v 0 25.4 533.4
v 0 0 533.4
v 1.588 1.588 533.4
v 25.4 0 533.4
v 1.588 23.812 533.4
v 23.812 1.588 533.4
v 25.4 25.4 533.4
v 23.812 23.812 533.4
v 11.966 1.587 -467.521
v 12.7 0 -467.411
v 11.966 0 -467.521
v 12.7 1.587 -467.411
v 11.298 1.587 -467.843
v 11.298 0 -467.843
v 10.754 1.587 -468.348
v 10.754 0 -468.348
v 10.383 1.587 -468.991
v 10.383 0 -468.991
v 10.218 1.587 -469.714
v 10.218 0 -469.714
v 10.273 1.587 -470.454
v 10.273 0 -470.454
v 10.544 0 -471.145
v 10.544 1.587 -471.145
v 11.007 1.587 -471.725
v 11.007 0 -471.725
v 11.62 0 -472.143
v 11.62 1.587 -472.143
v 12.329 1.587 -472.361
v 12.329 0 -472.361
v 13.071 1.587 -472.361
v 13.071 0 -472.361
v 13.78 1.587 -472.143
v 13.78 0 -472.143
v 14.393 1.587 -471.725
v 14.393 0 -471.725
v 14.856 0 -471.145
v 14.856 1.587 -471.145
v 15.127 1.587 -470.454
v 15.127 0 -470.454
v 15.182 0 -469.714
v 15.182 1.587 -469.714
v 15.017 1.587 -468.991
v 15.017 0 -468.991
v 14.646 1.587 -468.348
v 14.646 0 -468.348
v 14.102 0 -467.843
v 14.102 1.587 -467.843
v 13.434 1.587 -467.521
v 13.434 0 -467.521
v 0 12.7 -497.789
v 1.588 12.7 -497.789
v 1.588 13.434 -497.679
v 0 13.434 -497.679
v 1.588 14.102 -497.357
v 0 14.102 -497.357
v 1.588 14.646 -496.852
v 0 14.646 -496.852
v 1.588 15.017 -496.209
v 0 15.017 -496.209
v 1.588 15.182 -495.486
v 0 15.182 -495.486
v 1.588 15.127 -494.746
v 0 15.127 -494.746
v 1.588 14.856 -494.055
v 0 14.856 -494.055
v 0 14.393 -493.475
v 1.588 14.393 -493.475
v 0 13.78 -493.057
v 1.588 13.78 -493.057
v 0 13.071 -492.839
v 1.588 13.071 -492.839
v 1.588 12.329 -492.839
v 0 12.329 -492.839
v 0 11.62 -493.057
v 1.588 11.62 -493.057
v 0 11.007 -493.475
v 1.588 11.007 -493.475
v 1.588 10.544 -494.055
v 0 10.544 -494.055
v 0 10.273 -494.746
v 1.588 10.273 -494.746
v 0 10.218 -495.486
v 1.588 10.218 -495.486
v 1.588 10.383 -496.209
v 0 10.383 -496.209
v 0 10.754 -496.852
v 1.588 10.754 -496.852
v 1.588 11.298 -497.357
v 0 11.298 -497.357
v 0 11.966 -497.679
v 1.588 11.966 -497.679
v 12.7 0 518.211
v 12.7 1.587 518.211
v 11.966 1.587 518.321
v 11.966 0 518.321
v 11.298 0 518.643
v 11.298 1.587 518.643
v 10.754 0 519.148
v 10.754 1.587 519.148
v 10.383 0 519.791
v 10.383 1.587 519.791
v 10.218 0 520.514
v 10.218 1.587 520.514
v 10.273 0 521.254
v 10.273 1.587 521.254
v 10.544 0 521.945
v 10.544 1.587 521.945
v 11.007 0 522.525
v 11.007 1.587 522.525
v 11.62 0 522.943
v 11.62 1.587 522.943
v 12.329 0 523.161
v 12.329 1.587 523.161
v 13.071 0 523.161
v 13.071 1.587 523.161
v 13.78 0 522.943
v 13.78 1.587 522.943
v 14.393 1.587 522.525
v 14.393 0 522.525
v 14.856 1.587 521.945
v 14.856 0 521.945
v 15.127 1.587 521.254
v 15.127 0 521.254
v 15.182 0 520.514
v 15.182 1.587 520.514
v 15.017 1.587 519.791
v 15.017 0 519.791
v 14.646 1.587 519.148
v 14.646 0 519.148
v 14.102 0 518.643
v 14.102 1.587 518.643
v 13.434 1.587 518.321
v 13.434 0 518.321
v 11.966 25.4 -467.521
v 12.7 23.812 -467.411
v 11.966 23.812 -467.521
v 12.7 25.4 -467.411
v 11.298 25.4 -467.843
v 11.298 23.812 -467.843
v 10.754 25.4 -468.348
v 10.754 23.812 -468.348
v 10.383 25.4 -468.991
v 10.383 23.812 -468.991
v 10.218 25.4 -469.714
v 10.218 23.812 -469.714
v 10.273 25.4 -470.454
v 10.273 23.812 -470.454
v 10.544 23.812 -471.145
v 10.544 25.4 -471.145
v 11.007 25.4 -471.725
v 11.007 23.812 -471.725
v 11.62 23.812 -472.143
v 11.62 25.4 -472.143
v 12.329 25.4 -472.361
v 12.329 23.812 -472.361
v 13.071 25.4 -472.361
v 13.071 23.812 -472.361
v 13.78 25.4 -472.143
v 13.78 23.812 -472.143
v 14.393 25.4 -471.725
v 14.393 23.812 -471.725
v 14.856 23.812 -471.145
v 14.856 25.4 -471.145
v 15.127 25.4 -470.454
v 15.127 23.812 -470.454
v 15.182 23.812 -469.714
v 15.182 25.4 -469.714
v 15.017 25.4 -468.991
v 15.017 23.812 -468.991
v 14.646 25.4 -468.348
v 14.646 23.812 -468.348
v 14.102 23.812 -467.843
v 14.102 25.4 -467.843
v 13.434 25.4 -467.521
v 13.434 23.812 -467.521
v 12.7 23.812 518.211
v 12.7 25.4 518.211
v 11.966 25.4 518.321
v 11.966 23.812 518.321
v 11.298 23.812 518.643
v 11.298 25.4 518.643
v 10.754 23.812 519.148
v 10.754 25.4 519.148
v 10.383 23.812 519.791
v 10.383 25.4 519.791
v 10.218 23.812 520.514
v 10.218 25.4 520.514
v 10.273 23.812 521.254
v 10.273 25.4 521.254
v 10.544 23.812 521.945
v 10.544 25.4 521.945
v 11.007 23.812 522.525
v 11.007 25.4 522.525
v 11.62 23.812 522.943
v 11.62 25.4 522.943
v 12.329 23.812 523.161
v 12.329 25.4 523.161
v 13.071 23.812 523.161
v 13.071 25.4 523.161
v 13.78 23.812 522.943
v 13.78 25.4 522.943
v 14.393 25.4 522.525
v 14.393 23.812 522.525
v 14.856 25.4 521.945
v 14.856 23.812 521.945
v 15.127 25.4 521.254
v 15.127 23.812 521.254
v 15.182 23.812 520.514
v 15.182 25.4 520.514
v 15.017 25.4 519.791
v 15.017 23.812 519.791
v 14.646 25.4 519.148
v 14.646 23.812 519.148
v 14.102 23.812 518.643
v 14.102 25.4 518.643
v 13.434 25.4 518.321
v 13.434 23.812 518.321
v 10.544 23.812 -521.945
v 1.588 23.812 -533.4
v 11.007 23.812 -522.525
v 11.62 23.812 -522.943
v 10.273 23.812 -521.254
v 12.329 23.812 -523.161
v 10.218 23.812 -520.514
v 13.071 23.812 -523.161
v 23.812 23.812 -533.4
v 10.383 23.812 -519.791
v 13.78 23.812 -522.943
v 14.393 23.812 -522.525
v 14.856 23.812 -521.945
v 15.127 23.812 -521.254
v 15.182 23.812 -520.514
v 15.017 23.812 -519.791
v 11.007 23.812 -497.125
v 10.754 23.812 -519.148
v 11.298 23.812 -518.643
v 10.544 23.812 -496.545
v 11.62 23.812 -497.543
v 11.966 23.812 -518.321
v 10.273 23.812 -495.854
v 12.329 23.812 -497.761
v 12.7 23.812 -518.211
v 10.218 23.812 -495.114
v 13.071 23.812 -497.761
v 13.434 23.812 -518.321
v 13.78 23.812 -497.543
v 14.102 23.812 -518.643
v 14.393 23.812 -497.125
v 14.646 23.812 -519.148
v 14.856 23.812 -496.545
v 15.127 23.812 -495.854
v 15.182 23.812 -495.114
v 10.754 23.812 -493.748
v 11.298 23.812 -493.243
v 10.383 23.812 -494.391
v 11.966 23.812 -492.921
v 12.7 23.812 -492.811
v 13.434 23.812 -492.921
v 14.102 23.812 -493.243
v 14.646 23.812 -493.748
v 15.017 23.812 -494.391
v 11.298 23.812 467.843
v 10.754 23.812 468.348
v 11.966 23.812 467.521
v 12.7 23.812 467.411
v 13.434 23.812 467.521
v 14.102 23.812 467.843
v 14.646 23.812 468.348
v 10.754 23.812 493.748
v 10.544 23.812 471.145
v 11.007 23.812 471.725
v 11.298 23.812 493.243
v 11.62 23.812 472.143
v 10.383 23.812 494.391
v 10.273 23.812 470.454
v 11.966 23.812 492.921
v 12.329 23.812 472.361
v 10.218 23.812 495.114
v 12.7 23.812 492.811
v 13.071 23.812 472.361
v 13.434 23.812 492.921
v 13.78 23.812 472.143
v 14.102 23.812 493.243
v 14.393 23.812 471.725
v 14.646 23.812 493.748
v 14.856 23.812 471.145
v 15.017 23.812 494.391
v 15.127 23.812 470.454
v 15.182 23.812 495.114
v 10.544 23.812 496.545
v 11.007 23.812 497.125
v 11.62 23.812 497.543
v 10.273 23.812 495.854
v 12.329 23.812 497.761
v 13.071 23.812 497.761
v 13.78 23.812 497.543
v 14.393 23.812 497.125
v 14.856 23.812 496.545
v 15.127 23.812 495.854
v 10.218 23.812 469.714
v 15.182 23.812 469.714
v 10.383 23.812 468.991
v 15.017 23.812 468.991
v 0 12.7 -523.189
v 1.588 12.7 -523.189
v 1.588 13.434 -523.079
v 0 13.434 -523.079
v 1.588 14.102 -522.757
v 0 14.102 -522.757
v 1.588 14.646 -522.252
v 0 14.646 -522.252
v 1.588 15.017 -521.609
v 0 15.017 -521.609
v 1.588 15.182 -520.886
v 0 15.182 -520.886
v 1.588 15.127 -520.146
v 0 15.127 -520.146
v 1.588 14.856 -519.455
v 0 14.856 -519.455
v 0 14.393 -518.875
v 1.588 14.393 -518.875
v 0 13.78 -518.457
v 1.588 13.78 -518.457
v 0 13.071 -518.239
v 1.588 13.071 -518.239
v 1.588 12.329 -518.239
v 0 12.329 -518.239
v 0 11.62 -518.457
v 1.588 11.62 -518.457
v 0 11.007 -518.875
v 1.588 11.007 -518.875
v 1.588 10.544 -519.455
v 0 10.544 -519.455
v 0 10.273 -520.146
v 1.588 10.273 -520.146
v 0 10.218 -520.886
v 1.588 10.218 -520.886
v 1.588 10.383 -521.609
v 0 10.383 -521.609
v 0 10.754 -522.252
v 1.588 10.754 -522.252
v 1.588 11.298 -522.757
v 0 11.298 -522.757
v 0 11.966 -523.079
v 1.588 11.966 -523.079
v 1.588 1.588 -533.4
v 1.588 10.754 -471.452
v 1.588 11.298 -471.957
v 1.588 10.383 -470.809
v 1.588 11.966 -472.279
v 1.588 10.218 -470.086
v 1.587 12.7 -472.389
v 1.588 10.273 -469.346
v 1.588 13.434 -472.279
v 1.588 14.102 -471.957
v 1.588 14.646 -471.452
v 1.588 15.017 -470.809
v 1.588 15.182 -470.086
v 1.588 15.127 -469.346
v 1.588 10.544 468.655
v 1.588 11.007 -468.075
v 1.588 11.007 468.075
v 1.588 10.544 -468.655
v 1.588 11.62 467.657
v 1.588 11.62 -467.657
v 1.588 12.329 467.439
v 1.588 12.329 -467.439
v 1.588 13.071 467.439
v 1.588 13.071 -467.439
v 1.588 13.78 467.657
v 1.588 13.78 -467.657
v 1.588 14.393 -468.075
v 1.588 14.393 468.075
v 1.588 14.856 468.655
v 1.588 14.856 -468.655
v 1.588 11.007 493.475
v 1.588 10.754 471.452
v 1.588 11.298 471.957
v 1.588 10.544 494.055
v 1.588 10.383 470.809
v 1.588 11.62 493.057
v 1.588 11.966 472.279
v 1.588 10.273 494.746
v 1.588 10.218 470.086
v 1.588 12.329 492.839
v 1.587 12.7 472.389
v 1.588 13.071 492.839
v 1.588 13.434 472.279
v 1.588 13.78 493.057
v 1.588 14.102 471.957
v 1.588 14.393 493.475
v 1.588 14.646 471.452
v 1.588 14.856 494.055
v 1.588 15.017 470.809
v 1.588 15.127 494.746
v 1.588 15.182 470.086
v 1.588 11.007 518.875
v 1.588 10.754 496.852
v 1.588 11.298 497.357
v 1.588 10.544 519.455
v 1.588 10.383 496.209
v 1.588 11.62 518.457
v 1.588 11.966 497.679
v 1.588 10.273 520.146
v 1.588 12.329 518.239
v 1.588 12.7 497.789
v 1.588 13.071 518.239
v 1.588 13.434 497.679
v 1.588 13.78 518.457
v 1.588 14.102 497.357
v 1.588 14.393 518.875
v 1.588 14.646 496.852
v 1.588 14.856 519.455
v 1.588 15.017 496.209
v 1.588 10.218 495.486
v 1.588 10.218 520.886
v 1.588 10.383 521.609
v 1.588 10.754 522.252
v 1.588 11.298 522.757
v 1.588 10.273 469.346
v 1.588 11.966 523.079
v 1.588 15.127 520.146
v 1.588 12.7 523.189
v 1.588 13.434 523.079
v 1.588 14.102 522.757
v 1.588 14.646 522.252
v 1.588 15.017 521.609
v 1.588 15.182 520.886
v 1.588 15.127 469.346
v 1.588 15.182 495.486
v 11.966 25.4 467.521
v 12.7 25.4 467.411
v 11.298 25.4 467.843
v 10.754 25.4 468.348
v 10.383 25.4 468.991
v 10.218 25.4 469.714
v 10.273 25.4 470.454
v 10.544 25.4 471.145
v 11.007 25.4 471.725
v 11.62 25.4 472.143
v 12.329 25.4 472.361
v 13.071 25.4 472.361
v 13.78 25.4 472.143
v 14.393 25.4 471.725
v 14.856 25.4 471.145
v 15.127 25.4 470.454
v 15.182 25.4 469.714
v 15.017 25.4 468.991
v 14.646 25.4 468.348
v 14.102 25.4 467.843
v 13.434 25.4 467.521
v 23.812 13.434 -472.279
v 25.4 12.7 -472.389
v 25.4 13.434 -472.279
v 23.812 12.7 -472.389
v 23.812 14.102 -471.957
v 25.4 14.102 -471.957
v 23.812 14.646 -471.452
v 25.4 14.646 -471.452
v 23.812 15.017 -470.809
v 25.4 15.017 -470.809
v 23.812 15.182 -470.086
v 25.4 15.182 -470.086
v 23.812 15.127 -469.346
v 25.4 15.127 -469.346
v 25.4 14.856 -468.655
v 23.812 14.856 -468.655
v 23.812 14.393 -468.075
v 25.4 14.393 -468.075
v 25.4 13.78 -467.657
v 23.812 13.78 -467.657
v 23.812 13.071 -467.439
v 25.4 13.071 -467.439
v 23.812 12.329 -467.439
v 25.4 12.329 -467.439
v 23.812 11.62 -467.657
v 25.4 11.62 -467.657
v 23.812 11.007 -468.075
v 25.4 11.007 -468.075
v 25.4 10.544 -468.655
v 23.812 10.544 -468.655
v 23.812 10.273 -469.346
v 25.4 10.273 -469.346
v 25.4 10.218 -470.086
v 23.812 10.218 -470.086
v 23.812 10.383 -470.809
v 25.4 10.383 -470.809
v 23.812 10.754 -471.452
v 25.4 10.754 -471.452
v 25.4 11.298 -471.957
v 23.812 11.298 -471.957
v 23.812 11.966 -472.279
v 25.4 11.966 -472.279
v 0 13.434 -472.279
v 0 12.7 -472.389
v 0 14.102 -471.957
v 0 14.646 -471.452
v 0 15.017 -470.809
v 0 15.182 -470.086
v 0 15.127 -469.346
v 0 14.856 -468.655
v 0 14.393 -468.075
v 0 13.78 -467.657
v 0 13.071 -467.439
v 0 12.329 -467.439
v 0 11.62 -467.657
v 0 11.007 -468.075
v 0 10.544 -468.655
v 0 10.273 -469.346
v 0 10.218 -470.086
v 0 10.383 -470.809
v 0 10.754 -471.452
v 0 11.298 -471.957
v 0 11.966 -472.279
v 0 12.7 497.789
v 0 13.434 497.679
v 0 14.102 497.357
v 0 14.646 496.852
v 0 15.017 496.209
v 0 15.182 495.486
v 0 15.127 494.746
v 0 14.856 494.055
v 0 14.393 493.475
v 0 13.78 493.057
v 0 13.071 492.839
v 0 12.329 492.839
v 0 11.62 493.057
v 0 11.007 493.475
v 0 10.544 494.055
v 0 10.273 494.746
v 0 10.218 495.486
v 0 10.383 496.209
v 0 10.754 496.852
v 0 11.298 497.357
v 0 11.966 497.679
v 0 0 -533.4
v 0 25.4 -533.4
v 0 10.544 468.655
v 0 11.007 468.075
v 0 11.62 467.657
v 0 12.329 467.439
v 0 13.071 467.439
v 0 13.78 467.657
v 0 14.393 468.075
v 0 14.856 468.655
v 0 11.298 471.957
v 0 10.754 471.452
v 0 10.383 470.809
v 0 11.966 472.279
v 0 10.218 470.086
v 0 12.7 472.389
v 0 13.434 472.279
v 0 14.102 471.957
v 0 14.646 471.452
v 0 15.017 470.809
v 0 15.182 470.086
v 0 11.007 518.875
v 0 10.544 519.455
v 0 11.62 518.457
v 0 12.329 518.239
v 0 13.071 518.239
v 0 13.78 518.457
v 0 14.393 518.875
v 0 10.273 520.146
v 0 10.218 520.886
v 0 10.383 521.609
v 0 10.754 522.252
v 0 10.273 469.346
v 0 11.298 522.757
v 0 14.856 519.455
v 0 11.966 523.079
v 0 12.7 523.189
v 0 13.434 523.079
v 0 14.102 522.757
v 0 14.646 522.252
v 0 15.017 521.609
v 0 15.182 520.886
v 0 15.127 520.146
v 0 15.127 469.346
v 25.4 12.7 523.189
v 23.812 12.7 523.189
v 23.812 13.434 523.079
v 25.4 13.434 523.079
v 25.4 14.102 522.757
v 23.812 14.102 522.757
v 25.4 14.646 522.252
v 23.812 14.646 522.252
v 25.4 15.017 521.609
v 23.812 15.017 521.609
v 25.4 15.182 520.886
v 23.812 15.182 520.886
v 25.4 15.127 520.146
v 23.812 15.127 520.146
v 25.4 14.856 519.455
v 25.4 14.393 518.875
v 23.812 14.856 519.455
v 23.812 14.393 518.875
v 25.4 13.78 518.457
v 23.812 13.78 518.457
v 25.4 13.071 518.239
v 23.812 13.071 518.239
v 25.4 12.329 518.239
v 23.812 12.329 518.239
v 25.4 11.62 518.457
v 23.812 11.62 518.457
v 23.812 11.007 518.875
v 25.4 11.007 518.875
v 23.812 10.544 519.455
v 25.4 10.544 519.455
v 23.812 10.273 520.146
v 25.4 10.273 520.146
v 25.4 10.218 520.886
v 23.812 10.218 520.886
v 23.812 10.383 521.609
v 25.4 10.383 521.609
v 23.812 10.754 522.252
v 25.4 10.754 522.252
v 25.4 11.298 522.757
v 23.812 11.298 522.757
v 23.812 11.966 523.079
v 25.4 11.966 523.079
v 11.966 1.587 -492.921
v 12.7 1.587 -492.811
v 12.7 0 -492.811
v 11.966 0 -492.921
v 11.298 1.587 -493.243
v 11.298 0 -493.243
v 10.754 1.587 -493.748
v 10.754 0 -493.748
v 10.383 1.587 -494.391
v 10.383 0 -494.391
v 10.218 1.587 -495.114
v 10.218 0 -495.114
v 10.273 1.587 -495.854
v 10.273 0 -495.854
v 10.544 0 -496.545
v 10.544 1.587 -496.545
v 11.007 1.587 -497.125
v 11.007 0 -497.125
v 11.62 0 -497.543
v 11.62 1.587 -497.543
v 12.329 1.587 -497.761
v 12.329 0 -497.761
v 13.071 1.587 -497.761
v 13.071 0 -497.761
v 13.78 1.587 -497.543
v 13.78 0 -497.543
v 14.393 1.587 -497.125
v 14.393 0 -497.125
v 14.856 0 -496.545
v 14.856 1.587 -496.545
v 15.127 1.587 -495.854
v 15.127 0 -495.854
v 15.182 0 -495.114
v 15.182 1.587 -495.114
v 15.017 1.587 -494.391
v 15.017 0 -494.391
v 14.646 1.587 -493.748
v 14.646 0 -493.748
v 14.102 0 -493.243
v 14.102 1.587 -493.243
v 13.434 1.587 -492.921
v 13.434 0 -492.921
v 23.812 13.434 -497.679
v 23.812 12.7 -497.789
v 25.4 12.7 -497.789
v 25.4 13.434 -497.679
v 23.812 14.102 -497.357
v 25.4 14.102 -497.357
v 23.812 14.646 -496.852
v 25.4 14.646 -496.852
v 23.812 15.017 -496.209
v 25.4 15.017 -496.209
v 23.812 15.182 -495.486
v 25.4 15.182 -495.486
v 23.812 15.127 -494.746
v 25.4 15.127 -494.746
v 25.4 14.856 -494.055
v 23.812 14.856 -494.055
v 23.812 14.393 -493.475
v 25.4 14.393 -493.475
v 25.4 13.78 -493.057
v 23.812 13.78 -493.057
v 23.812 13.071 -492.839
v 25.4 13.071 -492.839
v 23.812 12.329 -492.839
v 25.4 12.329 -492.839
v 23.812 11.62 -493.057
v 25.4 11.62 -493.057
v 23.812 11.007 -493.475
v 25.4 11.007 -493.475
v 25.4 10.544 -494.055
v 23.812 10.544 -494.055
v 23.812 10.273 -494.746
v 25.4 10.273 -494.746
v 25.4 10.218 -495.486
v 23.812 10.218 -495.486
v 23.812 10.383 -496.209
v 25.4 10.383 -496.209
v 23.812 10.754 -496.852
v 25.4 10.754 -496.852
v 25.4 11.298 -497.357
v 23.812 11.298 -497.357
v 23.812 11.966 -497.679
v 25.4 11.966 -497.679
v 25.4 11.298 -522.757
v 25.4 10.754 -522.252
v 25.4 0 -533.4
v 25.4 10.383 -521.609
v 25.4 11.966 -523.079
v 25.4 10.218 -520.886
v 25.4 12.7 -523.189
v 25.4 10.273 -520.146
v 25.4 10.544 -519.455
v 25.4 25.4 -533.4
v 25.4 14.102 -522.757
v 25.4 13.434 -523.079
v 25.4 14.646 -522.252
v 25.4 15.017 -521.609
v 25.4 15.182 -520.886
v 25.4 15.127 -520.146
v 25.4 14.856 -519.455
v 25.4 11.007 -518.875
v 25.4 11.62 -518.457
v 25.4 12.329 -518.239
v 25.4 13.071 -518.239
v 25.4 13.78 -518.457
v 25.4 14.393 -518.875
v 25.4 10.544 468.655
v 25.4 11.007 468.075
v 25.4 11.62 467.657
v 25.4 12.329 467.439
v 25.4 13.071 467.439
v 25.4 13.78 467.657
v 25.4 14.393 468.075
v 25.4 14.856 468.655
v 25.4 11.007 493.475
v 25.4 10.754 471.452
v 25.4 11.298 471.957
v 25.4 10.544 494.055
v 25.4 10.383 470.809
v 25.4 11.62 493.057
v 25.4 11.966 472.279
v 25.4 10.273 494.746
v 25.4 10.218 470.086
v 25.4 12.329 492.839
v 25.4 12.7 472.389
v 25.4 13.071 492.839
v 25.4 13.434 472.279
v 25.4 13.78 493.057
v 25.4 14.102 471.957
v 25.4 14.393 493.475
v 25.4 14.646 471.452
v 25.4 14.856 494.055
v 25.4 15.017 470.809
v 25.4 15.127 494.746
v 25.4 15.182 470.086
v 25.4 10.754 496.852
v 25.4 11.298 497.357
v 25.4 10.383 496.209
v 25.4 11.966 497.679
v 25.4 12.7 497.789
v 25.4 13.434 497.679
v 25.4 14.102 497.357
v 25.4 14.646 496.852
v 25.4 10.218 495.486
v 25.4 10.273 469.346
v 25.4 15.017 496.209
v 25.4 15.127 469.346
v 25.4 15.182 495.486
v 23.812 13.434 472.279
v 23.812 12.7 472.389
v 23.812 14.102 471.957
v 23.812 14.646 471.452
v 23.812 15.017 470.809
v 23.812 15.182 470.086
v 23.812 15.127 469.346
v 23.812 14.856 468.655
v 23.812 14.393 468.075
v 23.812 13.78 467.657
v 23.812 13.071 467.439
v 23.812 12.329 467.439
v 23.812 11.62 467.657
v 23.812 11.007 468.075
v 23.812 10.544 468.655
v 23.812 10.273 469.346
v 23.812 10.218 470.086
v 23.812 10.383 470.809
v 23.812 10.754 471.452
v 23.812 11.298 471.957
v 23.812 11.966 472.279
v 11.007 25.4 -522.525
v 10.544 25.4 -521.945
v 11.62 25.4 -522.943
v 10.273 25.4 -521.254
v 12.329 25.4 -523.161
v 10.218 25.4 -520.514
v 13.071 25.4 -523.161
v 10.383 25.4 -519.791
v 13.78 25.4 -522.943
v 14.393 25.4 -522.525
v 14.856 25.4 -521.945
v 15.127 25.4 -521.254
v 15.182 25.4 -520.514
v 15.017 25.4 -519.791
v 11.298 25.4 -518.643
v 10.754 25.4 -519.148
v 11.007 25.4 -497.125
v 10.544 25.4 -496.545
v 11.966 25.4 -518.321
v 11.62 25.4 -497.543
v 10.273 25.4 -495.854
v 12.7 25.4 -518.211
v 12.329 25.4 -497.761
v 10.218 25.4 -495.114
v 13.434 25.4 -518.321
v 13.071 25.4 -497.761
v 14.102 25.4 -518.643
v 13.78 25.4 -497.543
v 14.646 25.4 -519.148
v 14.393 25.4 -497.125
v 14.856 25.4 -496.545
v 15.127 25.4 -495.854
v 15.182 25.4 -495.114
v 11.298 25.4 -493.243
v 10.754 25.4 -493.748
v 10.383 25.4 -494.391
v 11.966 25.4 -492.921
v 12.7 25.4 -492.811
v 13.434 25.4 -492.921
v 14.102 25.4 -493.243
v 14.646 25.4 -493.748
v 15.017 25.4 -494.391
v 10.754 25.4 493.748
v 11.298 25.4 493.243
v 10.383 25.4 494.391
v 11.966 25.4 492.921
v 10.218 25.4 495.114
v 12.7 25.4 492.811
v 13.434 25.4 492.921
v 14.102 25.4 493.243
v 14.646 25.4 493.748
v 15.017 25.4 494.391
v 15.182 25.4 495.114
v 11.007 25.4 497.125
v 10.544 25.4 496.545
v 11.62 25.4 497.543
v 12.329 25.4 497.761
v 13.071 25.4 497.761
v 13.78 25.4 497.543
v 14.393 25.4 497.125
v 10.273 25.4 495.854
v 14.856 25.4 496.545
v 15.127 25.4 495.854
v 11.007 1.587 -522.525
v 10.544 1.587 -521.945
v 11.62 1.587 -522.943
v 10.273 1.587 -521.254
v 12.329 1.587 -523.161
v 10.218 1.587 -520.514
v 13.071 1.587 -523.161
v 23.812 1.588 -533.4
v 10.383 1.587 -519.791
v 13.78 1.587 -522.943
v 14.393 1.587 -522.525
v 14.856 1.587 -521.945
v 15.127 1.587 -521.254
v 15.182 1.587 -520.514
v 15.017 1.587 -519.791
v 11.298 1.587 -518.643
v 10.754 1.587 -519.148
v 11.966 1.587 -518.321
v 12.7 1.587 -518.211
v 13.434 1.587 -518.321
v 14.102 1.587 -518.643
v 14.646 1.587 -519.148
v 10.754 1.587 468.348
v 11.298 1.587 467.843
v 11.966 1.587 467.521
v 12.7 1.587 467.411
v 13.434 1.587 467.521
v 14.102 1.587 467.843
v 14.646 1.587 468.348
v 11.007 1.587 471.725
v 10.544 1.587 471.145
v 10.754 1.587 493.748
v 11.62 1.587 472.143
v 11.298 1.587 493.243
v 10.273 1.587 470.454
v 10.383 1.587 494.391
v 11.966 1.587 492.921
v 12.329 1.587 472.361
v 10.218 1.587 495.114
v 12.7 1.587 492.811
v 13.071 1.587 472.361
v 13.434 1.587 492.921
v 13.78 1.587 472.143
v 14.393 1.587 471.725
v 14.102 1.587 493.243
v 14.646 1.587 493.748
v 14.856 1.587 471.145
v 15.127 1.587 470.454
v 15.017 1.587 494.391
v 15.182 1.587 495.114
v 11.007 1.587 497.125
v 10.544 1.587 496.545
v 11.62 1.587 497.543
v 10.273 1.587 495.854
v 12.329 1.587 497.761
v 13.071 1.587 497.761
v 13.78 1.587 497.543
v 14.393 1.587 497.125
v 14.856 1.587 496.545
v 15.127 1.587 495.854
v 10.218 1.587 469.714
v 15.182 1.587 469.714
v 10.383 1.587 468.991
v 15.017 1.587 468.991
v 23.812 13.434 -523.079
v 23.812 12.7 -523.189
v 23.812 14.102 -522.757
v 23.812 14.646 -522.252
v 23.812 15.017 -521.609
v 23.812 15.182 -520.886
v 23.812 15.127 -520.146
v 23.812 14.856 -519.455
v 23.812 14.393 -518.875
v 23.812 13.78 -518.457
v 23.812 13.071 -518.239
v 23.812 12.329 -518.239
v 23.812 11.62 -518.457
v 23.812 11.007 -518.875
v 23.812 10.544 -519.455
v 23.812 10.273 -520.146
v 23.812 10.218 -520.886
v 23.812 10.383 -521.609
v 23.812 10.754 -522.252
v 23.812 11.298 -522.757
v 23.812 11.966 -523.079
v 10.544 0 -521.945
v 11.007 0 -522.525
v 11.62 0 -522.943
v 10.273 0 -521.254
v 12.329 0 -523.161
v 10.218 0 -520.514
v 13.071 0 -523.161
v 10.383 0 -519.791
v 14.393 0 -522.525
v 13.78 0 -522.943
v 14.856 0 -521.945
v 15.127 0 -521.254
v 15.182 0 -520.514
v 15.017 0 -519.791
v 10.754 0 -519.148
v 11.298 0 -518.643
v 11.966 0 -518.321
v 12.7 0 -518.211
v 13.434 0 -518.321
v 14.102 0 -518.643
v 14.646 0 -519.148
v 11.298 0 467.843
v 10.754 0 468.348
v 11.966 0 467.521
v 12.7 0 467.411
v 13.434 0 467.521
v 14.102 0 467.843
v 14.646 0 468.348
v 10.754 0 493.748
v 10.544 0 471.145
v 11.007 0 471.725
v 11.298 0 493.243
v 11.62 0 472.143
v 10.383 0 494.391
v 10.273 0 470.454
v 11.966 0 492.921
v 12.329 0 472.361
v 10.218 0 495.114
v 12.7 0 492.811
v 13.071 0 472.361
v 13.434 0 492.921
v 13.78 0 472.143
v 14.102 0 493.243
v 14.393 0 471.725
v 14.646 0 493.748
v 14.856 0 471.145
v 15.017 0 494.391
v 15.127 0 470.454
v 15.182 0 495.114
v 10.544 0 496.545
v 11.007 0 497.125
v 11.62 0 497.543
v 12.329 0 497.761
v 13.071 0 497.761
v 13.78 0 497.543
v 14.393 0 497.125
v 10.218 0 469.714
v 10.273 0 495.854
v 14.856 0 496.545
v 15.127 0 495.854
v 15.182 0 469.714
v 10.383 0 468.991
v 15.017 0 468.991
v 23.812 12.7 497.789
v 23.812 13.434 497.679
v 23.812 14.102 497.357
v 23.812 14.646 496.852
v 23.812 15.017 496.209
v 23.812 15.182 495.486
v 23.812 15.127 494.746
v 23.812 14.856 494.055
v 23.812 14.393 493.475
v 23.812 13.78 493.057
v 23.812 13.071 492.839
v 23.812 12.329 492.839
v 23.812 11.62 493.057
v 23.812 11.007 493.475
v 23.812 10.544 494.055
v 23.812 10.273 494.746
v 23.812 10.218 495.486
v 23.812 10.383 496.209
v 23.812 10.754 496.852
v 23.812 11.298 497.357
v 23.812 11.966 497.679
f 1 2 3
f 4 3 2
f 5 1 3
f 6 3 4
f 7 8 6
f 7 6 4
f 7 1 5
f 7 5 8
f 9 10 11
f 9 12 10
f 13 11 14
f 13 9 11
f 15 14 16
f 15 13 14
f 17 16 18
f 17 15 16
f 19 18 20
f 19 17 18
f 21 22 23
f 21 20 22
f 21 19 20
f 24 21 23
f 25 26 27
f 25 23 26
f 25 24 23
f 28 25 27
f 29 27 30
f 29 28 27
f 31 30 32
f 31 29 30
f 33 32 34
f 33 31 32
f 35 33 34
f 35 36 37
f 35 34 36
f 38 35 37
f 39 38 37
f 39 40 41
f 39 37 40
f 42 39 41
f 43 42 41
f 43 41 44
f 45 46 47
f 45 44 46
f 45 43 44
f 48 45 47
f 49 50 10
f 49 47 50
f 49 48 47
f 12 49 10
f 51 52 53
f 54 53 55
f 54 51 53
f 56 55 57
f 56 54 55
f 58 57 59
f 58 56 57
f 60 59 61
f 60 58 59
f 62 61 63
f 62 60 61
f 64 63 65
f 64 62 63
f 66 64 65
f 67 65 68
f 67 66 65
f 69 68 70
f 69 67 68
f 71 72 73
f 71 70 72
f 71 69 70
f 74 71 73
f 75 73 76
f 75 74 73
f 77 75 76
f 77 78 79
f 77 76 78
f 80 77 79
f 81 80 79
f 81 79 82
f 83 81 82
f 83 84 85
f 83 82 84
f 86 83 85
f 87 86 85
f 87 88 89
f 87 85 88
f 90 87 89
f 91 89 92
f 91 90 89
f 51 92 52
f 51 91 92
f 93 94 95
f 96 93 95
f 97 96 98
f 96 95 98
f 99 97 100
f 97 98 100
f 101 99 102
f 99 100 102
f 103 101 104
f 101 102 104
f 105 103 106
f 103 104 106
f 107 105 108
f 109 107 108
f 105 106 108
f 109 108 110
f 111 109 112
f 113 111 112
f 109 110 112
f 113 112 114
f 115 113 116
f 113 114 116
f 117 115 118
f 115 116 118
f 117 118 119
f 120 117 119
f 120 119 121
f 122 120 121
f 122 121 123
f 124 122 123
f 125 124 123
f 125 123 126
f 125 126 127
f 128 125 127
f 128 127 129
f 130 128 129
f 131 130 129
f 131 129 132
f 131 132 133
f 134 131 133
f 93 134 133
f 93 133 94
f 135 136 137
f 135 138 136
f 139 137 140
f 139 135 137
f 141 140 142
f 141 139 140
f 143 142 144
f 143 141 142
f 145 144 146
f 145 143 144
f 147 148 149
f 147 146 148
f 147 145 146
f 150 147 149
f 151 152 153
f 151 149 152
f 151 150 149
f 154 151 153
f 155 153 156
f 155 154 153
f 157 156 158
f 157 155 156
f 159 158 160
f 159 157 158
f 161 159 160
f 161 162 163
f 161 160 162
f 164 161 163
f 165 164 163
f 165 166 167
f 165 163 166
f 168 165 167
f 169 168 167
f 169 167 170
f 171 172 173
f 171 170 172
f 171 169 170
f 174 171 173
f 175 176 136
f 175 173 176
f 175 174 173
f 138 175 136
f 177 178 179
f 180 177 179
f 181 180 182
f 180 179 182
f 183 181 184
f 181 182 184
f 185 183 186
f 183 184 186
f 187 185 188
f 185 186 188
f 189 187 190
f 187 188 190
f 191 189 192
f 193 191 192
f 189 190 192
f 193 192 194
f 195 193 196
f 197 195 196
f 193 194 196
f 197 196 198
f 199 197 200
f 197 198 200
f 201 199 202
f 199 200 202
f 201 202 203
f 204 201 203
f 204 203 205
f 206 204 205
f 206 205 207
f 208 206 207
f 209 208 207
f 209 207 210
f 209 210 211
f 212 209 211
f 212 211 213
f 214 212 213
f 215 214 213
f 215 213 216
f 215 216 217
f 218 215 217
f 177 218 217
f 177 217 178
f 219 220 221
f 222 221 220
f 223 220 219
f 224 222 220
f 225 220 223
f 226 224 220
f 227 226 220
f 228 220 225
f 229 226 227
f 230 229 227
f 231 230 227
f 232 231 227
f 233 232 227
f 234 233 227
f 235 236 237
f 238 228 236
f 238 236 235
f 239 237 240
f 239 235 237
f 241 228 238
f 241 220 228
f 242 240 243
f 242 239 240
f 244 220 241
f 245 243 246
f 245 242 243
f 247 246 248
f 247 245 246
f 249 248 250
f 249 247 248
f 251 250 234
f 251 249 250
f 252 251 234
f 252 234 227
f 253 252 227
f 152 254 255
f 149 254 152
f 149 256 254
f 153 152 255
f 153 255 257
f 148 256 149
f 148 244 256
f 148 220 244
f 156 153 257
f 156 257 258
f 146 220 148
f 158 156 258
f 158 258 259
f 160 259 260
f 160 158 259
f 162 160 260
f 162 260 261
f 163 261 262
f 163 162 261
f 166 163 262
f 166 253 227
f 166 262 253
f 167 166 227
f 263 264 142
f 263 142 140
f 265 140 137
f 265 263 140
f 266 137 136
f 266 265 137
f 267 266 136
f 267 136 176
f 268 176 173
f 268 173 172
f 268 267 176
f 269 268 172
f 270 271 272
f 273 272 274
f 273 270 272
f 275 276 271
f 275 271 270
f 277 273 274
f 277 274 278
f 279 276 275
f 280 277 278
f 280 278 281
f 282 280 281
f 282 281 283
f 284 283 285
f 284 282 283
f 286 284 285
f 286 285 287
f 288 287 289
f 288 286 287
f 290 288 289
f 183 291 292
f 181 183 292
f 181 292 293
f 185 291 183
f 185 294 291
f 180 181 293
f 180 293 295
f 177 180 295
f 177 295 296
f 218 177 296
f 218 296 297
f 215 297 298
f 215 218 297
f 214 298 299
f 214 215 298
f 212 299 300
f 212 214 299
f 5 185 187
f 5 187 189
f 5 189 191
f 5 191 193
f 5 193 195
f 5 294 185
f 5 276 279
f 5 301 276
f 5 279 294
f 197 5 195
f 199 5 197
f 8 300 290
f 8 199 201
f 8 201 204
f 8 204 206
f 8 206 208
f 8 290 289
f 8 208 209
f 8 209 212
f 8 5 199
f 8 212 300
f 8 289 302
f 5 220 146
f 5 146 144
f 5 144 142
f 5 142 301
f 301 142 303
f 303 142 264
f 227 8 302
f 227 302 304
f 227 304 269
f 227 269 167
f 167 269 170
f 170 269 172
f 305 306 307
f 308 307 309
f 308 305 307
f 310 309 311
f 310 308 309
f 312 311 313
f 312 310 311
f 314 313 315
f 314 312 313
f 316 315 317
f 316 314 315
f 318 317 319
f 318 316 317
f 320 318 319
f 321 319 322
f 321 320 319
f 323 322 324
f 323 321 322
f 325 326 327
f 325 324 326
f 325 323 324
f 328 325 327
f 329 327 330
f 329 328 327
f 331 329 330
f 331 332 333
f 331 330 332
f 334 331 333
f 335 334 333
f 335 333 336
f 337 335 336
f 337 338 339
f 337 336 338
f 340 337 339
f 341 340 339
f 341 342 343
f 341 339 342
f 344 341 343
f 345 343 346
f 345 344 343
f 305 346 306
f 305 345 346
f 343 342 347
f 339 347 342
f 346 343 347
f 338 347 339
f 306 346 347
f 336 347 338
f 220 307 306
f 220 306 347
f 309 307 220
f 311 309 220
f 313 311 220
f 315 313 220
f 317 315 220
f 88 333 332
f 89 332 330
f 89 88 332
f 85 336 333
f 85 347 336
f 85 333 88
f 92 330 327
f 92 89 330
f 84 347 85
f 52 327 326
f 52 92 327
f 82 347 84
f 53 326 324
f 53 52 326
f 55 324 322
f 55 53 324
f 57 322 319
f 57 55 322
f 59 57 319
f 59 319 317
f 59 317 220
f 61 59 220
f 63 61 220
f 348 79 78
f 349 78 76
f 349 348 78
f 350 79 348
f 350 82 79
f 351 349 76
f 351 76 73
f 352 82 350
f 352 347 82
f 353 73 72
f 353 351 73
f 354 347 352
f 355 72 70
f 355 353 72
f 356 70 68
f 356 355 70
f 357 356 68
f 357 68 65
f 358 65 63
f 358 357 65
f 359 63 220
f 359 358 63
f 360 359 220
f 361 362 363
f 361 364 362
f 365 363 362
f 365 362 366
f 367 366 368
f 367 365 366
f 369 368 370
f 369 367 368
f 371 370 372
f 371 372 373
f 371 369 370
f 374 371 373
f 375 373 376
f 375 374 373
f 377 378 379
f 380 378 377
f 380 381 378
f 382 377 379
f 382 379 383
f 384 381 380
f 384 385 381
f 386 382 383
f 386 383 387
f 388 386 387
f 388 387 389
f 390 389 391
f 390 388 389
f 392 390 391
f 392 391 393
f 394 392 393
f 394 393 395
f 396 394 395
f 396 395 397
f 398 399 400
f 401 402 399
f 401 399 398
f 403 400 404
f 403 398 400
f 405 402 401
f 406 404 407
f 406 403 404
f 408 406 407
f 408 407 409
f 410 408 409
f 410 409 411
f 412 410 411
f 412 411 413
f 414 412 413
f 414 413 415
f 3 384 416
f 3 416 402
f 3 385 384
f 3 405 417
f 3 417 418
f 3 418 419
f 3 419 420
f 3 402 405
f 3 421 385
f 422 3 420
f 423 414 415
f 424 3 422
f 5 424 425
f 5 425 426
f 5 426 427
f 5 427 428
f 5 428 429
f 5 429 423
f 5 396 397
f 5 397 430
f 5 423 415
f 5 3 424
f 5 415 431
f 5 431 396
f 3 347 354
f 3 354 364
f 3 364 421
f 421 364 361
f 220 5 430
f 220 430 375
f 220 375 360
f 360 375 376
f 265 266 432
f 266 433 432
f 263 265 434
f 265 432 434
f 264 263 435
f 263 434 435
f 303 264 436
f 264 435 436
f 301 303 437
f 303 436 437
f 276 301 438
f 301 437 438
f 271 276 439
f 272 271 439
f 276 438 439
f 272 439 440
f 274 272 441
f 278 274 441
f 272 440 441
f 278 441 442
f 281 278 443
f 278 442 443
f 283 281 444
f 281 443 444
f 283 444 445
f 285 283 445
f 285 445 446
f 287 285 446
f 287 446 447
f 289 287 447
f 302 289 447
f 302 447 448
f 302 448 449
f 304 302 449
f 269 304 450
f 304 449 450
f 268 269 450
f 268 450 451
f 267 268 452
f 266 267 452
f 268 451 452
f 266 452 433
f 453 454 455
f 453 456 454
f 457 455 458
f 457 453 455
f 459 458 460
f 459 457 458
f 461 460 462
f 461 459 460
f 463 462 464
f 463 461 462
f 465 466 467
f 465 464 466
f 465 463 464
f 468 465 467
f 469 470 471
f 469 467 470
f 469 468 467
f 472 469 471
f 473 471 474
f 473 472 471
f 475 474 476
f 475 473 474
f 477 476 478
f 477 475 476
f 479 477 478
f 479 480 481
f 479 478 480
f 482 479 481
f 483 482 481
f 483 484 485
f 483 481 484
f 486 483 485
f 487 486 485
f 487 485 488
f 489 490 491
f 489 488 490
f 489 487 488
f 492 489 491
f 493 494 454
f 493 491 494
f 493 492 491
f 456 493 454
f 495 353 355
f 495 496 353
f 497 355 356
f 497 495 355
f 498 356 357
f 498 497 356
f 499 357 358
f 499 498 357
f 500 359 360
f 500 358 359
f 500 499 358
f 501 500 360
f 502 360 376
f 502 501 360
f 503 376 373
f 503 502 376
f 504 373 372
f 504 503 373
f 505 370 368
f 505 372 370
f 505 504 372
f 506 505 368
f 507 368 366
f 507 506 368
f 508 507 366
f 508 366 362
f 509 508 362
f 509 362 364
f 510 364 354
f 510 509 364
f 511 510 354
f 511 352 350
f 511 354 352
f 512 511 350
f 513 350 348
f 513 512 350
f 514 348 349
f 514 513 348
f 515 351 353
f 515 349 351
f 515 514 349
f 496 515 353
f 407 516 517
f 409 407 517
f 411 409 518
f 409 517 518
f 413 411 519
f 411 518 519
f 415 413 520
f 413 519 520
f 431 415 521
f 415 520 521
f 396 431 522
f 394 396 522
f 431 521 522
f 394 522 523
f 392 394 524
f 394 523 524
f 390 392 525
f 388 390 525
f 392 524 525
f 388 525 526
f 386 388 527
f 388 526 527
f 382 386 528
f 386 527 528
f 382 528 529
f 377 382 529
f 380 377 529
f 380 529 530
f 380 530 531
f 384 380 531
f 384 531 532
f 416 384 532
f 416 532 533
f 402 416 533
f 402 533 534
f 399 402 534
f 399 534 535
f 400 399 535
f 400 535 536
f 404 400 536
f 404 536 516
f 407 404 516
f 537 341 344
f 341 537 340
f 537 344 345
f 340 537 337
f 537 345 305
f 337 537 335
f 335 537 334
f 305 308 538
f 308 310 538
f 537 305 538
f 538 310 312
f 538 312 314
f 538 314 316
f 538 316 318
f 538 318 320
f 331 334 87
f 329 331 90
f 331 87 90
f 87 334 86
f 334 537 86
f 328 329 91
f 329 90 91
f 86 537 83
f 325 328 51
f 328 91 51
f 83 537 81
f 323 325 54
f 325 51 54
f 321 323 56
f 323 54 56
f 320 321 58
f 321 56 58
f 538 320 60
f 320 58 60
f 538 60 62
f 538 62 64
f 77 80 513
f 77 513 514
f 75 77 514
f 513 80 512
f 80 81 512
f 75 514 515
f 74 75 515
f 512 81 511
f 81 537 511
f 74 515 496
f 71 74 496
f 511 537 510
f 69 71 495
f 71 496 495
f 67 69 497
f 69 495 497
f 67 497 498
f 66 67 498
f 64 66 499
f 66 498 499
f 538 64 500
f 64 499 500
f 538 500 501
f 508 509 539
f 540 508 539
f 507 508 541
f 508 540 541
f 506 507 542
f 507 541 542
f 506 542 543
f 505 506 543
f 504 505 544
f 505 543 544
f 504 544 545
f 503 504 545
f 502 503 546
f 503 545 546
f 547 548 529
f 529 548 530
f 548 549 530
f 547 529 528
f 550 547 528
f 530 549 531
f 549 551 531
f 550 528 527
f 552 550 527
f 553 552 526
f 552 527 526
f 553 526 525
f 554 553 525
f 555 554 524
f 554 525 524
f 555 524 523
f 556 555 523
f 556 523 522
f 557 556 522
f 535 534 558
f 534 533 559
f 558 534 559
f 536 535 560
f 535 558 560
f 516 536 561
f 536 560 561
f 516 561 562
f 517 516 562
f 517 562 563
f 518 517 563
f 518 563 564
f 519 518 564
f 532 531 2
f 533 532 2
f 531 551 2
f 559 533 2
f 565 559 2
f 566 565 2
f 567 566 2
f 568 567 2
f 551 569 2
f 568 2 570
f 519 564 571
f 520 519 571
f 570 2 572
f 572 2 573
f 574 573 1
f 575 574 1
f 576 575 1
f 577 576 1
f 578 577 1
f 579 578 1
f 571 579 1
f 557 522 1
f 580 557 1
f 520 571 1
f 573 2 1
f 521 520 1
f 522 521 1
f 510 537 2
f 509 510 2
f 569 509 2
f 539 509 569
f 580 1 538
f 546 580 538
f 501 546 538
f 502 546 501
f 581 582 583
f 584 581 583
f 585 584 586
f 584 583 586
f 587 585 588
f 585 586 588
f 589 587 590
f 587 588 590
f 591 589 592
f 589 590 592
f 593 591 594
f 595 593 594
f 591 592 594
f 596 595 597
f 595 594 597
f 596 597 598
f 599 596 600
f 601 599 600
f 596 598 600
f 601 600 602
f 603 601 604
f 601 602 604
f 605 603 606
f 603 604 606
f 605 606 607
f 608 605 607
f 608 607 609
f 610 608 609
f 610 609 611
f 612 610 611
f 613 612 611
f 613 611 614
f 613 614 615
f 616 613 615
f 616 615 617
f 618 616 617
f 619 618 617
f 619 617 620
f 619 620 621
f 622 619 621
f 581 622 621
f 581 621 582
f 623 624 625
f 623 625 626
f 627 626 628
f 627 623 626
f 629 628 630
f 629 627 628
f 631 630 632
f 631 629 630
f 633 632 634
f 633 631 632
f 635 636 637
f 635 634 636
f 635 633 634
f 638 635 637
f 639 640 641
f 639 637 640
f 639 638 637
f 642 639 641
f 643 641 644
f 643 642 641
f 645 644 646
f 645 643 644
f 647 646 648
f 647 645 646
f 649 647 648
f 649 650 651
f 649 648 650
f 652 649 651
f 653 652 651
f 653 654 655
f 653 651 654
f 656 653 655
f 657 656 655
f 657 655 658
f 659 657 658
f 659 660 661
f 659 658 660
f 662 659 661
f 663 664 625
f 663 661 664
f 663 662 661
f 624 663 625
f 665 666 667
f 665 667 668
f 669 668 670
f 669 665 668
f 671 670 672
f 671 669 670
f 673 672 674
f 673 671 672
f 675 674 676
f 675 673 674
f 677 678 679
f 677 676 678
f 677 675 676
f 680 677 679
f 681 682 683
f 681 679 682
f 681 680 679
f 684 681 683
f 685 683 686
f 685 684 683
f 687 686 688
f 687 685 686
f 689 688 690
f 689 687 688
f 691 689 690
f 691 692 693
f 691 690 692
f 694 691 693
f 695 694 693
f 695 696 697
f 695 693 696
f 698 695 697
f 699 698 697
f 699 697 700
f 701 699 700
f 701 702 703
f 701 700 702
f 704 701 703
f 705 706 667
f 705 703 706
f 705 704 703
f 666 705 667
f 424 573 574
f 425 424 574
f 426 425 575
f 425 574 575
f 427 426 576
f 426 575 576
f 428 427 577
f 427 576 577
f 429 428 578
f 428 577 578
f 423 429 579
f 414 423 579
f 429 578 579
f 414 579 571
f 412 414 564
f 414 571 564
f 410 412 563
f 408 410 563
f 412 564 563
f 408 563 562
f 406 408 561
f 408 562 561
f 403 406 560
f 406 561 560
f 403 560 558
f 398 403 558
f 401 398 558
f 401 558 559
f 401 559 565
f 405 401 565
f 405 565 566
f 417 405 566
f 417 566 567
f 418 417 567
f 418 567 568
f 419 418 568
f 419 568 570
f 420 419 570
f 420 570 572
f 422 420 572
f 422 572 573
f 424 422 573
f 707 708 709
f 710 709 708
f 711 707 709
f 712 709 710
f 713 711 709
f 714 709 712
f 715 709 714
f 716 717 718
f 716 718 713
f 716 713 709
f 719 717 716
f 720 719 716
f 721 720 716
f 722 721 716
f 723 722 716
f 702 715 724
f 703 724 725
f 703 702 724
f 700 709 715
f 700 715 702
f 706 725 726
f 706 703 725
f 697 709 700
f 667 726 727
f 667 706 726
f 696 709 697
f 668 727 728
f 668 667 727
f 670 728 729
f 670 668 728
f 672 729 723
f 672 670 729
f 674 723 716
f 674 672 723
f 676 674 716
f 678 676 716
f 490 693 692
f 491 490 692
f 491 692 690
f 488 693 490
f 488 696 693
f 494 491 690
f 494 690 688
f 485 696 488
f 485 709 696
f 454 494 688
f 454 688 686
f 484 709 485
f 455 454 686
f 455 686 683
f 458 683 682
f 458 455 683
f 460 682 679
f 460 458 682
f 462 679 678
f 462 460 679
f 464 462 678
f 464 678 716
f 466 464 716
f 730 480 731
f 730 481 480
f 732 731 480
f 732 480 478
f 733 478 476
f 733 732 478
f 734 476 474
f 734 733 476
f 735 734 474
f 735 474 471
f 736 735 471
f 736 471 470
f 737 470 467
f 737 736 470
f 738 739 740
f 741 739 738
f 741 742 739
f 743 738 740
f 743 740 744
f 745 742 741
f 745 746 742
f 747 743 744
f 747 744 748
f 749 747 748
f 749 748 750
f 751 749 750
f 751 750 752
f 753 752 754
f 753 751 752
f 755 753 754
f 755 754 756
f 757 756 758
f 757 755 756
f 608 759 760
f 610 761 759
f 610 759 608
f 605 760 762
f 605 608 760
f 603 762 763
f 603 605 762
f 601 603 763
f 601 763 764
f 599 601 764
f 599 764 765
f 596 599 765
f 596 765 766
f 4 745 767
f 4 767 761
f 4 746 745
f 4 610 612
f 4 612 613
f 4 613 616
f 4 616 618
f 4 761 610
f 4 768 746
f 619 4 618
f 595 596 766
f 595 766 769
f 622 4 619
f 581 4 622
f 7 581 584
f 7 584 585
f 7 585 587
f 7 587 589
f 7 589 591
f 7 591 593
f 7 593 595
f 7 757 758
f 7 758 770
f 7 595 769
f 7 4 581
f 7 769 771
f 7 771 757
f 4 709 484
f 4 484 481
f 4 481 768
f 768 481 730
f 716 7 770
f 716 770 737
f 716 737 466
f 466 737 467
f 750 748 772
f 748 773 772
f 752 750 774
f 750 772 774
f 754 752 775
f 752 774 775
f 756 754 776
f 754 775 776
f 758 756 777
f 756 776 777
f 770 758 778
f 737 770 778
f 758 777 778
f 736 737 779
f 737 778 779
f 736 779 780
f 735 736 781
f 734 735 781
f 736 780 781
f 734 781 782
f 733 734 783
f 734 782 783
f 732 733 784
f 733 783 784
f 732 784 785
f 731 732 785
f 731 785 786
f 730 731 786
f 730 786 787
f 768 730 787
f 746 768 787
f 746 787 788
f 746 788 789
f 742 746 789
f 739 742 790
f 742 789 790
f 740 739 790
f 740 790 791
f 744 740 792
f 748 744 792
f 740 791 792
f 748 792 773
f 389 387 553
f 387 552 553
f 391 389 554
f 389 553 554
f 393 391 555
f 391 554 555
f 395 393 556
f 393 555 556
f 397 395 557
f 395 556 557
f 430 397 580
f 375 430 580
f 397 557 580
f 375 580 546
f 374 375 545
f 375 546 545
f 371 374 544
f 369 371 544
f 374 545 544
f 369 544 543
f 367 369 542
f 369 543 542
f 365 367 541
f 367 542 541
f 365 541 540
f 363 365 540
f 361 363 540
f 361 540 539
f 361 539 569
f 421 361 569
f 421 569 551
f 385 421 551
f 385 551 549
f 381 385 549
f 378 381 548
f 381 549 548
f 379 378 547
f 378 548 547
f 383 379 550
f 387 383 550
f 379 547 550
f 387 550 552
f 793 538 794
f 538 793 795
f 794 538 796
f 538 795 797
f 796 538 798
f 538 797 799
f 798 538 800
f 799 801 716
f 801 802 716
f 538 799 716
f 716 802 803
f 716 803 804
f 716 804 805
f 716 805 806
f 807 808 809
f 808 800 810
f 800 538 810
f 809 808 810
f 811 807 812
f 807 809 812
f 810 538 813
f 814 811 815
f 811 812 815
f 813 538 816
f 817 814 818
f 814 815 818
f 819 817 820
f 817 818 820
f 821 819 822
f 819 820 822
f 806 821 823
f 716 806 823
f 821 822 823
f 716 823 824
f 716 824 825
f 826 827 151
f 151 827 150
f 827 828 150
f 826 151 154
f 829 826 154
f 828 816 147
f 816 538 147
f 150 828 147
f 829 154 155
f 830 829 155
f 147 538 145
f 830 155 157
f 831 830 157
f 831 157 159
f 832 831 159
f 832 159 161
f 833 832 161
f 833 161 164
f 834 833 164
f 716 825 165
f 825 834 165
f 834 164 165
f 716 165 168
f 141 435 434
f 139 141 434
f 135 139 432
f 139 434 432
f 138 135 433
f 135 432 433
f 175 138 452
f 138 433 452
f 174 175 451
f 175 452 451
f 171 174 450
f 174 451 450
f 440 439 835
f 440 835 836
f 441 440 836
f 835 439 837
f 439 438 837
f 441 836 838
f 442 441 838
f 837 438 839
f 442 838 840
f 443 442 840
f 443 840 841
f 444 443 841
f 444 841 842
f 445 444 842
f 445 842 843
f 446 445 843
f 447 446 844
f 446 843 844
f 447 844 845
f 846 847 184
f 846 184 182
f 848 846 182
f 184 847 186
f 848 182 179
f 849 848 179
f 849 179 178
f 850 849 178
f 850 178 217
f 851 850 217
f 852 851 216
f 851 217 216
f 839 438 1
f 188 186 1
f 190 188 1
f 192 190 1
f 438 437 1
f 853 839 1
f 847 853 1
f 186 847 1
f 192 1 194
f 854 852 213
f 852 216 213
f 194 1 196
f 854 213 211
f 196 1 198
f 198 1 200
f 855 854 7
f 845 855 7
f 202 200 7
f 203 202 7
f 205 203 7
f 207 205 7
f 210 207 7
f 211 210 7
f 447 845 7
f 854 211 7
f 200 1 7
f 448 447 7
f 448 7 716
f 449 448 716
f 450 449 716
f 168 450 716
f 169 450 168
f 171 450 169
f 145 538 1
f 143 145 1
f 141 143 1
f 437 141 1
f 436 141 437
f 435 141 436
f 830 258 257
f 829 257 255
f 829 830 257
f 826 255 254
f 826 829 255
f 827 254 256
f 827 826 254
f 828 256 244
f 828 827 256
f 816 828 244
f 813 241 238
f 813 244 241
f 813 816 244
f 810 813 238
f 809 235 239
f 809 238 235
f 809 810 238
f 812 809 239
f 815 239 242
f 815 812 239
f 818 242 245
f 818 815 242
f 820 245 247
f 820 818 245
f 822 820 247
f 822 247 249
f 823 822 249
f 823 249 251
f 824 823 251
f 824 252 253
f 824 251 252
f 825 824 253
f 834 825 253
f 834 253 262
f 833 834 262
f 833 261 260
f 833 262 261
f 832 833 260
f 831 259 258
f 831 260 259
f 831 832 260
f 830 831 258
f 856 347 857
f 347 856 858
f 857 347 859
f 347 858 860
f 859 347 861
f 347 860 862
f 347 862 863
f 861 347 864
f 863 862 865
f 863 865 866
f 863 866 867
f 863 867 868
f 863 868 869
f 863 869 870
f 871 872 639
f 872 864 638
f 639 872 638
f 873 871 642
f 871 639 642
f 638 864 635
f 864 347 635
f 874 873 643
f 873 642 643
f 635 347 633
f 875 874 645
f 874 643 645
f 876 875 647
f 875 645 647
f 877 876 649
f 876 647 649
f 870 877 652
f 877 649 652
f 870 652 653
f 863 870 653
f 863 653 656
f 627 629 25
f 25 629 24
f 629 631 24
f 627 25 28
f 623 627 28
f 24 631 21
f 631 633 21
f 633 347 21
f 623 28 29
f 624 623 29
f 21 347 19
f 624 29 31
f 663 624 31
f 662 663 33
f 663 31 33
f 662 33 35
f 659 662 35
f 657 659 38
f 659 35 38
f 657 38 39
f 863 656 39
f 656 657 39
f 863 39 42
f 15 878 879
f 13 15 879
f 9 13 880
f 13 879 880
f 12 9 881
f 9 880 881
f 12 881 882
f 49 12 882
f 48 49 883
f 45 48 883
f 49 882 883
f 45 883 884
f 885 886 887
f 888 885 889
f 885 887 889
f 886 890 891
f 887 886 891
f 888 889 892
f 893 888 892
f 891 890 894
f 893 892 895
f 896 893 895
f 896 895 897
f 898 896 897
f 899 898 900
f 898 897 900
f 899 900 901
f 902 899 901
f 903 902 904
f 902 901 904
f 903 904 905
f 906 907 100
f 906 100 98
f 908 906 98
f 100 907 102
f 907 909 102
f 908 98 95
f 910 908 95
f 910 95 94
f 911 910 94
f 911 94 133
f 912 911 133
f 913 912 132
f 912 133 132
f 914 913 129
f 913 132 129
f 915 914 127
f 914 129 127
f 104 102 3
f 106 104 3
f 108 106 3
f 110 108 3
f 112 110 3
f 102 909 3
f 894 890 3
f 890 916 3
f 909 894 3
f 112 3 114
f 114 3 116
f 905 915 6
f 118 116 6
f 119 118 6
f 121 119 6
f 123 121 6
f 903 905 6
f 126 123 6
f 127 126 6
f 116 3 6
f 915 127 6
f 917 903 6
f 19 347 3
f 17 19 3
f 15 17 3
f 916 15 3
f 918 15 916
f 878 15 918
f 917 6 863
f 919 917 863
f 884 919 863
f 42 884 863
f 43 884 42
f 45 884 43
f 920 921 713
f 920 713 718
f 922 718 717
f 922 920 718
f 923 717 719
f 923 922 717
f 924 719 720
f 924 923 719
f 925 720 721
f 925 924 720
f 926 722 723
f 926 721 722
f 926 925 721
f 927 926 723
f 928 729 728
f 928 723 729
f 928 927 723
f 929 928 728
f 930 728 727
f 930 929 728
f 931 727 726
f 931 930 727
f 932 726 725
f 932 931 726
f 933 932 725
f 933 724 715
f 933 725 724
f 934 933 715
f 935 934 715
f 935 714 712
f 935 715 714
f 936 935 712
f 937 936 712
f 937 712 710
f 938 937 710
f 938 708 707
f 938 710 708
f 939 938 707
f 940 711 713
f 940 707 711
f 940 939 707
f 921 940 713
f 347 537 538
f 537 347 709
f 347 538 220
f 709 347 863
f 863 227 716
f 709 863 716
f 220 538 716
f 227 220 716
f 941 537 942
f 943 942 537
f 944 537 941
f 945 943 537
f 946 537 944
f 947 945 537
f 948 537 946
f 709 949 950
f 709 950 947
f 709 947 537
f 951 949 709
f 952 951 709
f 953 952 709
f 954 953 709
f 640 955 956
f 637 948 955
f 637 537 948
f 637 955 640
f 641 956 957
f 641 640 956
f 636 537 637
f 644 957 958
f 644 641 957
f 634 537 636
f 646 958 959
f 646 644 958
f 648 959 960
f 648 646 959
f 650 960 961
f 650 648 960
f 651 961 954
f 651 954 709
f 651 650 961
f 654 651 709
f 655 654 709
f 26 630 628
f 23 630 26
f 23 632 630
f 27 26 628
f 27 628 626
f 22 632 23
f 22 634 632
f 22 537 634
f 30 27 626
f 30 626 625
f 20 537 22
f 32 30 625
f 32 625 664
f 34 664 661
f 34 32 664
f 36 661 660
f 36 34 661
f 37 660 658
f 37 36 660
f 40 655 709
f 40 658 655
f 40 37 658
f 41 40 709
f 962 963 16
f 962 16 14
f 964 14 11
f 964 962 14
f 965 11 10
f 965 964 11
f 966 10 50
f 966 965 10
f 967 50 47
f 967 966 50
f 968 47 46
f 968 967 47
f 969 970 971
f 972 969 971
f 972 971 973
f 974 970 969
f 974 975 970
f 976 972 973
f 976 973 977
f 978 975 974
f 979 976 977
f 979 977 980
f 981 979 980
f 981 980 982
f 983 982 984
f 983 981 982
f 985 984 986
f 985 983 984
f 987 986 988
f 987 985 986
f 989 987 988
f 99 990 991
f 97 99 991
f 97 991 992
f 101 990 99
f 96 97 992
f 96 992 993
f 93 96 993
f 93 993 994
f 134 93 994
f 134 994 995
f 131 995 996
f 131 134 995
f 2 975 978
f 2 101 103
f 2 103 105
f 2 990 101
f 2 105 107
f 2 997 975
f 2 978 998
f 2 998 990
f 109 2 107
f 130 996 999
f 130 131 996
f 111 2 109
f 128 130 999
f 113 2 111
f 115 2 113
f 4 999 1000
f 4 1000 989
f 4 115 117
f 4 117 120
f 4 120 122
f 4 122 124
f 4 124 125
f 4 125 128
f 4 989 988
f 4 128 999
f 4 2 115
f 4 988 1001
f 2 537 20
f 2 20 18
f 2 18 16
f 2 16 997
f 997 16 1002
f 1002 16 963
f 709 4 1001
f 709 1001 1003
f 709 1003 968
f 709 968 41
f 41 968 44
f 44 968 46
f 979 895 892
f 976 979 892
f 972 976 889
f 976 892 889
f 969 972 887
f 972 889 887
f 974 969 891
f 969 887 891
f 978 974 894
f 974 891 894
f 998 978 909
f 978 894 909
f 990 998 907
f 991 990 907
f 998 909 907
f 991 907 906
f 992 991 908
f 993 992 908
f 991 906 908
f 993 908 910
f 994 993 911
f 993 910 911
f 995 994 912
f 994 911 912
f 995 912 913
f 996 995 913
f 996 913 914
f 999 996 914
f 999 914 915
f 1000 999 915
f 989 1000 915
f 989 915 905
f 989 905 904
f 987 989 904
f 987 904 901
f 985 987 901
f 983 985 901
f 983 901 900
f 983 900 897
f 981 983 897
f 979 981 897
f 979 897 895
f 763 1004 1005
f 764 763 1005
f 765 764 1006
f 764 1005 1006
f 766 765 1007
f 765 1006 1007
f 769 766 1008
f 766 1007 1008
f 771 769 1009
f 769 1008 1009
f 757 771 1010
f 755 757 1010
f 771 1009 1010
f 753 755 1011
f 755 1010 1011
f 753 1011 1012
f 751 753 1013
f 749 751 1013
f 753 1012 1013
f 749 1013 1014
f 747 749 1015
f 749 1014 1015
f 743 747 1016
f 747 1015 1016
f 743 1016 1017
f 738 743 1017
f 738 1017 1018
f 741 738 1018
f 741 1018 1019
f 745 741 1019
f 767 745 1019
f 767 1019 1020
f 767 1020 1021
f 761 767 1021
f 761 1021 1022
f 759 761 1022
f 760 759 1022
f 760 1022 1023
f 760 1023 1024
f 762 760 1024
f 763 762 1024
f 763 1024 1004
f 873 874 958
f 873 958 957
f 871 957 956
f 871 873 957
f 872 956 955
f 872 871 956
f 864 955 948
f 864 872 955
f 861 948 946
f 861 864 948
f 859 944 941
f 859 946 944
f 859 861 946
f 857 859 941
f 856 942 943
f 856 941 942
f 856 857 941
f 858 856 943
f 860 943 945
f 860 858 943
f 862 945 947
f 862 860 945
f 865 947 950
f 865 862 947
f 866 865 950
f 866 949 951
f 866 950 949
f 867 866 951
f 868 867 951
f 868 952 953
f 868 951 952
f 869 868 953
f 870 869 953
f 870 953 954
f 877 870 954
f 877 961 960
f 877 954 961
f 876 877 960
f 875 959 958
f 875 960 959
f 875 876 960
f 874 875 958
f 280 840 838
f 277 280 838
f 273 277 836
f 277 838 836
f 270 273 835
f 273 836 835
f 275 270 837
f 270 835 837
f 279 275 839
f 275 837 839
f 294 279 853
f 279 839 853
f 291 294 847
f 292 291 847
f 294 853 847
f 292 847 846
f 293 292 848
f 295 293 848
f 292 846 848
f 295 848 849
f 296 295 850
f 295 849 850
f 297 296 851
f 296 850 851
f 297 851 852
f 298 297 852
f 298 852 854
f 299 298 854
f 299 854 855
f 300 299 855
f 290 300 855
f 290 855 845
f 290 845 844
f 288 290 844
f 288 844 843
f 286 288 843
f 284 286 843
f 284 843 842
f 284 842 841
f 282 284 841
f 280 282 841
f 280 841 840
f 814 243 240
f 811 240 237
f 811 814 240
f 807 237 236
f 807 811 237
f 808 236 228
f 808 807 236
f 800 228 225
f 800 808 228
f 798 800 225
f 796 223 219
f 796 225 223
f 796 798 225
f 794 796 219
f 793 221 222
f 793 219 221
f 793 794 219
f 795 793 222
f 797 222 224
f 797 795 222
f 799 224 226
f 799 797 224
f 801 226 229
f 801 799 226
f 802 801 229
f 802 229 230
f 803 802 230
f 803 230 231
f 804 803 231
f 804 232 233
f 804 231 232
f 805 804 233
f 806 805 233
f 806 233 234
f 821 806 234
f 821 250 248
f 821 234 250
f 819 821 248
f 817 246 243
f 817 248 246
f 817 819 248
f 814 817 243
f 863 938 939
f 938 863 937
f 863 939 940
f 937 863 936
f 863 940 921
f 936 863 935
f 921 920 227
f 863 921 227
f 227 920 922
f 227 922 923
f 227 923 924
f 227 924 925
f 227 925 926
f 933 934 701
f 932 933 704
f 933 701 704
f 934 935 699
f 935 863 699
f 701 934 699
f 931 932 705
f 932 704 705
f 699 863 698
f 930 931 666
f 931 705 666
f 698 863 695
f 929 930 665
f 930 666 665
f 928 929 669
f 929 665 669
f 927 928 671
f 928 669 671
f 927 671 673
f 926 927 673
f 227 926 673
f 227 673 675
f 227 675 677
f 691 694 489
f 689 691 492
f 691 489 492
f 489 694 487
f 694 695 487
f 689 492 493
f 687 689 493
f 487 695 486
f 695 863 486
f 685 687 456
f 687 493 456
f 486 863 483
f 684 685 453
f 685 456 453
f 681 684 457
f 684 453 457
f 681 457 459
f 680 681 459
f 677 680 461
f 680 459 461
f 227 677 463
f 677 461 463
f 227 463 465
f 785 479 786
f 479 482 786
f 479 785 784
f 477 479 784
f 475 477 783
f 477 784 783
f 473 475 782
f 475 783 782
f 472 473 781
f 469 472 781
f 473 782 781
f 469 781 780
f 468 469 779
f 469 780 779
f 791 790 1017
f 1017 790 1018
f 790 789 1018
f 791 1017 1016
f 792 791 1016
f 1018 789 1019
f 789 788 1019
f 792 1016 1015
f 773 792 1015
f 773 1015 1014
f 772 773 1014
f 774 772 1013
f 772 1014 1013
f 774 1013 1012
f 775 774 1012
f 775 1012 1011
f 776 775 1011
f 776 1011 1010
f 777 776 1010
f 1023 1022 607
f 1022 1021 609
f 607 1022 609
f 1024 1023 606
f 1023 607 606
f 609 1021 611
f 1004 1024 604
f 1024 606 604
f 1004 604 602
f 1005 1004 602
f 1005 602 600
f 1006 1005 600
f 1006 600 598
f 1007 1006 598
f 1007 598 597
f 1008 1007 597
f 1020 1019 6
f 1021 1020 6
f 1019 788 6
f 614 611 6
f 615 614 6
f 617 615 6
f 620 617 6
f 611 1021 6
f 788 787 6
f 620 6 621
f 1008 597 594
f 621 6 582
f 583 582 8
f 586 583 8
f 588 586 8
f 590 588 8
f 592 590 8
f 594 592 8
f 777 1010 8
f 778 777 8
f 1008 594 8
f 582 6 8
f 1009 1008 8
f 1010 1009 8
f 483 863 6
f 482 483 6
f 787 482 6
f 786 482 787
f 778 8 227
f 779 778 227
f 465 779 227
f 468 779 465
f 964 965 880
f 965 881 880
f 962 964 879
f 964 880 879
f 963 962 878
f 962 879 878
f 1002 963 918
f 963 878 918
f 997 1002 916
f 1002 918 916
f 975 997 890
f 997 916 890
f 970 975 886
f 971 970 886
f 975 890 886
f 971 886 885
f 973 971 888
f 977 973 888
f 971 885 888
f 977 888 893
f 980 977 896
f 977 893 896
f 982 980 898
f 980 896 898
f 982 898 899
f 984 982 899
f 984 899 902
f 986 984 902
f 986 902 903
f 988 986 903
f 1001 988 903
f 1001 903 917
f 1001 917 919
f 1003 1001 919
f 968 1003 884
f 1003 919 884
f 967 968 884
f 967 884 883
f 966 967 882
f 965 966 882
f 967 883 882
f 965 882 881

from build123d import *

# Parameters (mm, degrees)
SKETCH1_W           = 25.4
SKETCH1_H           = 25.4
BOSS_EXTRUDE1_DEPTH = 533.4
SHELL1_T            = -1.5875
SKETCH3_R           = 2.4892
CUT_EXTRUDE1_DEPTH  = 533.4
SKETCH4_R           = 2.4892
CUT_EXTRUDE2_DEPTH  = 533.4


with BuildPart() as part:
    # Sketch1 → Boss-Extrude1 (new, symmetric)
    with BuildSketch(Plane.XY):
        with Locations((12.7, 12.7)):
            Rectangle(SKETCH1_W, SKETCH1_H)
    extrude(amount=BOSS_EXTRUDE1_DEPTH, both=True)

    # Shell1
    shell1_openings = [part.faces().sort_by_distance(p)[0] for p in [
        (12.7, 12.7, 533.4),
        (12.7, 12.7, -533.4),
    ]]
    offset(amount=SHELL1_T, openings=shell1_openings, kind=Kind.INTERSECTION)

    # Sketch3 → Cut-Extrude1 (cut, symmetric)
    with BuildSketch(Plane(origin=(0, 25.4, 0), x_dir=(1, 0, 0), z_dir=(0, 1, 0))):
        with Locations(Location((12.7, -520.7, 0), (0, 0, 90))):
            Circle(SKETCH3_R)
        with Locations(Location((12.7, -495.3, 0), (0, 0, 90))):
            Circle(SKETCH3_R)
        with Locations(Location((12.7, -469.9, 0), (0, 0, 90))):
            Circle(SKETCH3_R)
    cut_extrude1 = extrude(amount=CUT_EXTRUDE1_DEPTH, both=True, mode=Mode.SUBTRACT)

    # Sketch4 → Cut-Extrude2 (cut, symmetric)
    with BuildSketch(Plane.ZY):
        with Locations((520.7, 12.7)):
            Circle(SKETCH4_R)
        with Locations((495.3, 12.7)):
            Circle(SKETCH4_R)
        with Locations((469.9, 12.7)):
            Circle(SKETCH4_R)
    cut_extrude2 = extrude(amount=CUT_EXTRUDE2_DEPTH, both=True, mode=Mode.SUBTRACT)

    # Mirror1: Cut-Extrude1, Cut-Extrude2 across plane
    add(cut_extrude1.mirror(Plane.XY), mode=Mode.SUBTRACT)
    add(cut_extrude2.mirror(Plane.XY), mode=Mode.SUBTRACT)


solid = part.part
